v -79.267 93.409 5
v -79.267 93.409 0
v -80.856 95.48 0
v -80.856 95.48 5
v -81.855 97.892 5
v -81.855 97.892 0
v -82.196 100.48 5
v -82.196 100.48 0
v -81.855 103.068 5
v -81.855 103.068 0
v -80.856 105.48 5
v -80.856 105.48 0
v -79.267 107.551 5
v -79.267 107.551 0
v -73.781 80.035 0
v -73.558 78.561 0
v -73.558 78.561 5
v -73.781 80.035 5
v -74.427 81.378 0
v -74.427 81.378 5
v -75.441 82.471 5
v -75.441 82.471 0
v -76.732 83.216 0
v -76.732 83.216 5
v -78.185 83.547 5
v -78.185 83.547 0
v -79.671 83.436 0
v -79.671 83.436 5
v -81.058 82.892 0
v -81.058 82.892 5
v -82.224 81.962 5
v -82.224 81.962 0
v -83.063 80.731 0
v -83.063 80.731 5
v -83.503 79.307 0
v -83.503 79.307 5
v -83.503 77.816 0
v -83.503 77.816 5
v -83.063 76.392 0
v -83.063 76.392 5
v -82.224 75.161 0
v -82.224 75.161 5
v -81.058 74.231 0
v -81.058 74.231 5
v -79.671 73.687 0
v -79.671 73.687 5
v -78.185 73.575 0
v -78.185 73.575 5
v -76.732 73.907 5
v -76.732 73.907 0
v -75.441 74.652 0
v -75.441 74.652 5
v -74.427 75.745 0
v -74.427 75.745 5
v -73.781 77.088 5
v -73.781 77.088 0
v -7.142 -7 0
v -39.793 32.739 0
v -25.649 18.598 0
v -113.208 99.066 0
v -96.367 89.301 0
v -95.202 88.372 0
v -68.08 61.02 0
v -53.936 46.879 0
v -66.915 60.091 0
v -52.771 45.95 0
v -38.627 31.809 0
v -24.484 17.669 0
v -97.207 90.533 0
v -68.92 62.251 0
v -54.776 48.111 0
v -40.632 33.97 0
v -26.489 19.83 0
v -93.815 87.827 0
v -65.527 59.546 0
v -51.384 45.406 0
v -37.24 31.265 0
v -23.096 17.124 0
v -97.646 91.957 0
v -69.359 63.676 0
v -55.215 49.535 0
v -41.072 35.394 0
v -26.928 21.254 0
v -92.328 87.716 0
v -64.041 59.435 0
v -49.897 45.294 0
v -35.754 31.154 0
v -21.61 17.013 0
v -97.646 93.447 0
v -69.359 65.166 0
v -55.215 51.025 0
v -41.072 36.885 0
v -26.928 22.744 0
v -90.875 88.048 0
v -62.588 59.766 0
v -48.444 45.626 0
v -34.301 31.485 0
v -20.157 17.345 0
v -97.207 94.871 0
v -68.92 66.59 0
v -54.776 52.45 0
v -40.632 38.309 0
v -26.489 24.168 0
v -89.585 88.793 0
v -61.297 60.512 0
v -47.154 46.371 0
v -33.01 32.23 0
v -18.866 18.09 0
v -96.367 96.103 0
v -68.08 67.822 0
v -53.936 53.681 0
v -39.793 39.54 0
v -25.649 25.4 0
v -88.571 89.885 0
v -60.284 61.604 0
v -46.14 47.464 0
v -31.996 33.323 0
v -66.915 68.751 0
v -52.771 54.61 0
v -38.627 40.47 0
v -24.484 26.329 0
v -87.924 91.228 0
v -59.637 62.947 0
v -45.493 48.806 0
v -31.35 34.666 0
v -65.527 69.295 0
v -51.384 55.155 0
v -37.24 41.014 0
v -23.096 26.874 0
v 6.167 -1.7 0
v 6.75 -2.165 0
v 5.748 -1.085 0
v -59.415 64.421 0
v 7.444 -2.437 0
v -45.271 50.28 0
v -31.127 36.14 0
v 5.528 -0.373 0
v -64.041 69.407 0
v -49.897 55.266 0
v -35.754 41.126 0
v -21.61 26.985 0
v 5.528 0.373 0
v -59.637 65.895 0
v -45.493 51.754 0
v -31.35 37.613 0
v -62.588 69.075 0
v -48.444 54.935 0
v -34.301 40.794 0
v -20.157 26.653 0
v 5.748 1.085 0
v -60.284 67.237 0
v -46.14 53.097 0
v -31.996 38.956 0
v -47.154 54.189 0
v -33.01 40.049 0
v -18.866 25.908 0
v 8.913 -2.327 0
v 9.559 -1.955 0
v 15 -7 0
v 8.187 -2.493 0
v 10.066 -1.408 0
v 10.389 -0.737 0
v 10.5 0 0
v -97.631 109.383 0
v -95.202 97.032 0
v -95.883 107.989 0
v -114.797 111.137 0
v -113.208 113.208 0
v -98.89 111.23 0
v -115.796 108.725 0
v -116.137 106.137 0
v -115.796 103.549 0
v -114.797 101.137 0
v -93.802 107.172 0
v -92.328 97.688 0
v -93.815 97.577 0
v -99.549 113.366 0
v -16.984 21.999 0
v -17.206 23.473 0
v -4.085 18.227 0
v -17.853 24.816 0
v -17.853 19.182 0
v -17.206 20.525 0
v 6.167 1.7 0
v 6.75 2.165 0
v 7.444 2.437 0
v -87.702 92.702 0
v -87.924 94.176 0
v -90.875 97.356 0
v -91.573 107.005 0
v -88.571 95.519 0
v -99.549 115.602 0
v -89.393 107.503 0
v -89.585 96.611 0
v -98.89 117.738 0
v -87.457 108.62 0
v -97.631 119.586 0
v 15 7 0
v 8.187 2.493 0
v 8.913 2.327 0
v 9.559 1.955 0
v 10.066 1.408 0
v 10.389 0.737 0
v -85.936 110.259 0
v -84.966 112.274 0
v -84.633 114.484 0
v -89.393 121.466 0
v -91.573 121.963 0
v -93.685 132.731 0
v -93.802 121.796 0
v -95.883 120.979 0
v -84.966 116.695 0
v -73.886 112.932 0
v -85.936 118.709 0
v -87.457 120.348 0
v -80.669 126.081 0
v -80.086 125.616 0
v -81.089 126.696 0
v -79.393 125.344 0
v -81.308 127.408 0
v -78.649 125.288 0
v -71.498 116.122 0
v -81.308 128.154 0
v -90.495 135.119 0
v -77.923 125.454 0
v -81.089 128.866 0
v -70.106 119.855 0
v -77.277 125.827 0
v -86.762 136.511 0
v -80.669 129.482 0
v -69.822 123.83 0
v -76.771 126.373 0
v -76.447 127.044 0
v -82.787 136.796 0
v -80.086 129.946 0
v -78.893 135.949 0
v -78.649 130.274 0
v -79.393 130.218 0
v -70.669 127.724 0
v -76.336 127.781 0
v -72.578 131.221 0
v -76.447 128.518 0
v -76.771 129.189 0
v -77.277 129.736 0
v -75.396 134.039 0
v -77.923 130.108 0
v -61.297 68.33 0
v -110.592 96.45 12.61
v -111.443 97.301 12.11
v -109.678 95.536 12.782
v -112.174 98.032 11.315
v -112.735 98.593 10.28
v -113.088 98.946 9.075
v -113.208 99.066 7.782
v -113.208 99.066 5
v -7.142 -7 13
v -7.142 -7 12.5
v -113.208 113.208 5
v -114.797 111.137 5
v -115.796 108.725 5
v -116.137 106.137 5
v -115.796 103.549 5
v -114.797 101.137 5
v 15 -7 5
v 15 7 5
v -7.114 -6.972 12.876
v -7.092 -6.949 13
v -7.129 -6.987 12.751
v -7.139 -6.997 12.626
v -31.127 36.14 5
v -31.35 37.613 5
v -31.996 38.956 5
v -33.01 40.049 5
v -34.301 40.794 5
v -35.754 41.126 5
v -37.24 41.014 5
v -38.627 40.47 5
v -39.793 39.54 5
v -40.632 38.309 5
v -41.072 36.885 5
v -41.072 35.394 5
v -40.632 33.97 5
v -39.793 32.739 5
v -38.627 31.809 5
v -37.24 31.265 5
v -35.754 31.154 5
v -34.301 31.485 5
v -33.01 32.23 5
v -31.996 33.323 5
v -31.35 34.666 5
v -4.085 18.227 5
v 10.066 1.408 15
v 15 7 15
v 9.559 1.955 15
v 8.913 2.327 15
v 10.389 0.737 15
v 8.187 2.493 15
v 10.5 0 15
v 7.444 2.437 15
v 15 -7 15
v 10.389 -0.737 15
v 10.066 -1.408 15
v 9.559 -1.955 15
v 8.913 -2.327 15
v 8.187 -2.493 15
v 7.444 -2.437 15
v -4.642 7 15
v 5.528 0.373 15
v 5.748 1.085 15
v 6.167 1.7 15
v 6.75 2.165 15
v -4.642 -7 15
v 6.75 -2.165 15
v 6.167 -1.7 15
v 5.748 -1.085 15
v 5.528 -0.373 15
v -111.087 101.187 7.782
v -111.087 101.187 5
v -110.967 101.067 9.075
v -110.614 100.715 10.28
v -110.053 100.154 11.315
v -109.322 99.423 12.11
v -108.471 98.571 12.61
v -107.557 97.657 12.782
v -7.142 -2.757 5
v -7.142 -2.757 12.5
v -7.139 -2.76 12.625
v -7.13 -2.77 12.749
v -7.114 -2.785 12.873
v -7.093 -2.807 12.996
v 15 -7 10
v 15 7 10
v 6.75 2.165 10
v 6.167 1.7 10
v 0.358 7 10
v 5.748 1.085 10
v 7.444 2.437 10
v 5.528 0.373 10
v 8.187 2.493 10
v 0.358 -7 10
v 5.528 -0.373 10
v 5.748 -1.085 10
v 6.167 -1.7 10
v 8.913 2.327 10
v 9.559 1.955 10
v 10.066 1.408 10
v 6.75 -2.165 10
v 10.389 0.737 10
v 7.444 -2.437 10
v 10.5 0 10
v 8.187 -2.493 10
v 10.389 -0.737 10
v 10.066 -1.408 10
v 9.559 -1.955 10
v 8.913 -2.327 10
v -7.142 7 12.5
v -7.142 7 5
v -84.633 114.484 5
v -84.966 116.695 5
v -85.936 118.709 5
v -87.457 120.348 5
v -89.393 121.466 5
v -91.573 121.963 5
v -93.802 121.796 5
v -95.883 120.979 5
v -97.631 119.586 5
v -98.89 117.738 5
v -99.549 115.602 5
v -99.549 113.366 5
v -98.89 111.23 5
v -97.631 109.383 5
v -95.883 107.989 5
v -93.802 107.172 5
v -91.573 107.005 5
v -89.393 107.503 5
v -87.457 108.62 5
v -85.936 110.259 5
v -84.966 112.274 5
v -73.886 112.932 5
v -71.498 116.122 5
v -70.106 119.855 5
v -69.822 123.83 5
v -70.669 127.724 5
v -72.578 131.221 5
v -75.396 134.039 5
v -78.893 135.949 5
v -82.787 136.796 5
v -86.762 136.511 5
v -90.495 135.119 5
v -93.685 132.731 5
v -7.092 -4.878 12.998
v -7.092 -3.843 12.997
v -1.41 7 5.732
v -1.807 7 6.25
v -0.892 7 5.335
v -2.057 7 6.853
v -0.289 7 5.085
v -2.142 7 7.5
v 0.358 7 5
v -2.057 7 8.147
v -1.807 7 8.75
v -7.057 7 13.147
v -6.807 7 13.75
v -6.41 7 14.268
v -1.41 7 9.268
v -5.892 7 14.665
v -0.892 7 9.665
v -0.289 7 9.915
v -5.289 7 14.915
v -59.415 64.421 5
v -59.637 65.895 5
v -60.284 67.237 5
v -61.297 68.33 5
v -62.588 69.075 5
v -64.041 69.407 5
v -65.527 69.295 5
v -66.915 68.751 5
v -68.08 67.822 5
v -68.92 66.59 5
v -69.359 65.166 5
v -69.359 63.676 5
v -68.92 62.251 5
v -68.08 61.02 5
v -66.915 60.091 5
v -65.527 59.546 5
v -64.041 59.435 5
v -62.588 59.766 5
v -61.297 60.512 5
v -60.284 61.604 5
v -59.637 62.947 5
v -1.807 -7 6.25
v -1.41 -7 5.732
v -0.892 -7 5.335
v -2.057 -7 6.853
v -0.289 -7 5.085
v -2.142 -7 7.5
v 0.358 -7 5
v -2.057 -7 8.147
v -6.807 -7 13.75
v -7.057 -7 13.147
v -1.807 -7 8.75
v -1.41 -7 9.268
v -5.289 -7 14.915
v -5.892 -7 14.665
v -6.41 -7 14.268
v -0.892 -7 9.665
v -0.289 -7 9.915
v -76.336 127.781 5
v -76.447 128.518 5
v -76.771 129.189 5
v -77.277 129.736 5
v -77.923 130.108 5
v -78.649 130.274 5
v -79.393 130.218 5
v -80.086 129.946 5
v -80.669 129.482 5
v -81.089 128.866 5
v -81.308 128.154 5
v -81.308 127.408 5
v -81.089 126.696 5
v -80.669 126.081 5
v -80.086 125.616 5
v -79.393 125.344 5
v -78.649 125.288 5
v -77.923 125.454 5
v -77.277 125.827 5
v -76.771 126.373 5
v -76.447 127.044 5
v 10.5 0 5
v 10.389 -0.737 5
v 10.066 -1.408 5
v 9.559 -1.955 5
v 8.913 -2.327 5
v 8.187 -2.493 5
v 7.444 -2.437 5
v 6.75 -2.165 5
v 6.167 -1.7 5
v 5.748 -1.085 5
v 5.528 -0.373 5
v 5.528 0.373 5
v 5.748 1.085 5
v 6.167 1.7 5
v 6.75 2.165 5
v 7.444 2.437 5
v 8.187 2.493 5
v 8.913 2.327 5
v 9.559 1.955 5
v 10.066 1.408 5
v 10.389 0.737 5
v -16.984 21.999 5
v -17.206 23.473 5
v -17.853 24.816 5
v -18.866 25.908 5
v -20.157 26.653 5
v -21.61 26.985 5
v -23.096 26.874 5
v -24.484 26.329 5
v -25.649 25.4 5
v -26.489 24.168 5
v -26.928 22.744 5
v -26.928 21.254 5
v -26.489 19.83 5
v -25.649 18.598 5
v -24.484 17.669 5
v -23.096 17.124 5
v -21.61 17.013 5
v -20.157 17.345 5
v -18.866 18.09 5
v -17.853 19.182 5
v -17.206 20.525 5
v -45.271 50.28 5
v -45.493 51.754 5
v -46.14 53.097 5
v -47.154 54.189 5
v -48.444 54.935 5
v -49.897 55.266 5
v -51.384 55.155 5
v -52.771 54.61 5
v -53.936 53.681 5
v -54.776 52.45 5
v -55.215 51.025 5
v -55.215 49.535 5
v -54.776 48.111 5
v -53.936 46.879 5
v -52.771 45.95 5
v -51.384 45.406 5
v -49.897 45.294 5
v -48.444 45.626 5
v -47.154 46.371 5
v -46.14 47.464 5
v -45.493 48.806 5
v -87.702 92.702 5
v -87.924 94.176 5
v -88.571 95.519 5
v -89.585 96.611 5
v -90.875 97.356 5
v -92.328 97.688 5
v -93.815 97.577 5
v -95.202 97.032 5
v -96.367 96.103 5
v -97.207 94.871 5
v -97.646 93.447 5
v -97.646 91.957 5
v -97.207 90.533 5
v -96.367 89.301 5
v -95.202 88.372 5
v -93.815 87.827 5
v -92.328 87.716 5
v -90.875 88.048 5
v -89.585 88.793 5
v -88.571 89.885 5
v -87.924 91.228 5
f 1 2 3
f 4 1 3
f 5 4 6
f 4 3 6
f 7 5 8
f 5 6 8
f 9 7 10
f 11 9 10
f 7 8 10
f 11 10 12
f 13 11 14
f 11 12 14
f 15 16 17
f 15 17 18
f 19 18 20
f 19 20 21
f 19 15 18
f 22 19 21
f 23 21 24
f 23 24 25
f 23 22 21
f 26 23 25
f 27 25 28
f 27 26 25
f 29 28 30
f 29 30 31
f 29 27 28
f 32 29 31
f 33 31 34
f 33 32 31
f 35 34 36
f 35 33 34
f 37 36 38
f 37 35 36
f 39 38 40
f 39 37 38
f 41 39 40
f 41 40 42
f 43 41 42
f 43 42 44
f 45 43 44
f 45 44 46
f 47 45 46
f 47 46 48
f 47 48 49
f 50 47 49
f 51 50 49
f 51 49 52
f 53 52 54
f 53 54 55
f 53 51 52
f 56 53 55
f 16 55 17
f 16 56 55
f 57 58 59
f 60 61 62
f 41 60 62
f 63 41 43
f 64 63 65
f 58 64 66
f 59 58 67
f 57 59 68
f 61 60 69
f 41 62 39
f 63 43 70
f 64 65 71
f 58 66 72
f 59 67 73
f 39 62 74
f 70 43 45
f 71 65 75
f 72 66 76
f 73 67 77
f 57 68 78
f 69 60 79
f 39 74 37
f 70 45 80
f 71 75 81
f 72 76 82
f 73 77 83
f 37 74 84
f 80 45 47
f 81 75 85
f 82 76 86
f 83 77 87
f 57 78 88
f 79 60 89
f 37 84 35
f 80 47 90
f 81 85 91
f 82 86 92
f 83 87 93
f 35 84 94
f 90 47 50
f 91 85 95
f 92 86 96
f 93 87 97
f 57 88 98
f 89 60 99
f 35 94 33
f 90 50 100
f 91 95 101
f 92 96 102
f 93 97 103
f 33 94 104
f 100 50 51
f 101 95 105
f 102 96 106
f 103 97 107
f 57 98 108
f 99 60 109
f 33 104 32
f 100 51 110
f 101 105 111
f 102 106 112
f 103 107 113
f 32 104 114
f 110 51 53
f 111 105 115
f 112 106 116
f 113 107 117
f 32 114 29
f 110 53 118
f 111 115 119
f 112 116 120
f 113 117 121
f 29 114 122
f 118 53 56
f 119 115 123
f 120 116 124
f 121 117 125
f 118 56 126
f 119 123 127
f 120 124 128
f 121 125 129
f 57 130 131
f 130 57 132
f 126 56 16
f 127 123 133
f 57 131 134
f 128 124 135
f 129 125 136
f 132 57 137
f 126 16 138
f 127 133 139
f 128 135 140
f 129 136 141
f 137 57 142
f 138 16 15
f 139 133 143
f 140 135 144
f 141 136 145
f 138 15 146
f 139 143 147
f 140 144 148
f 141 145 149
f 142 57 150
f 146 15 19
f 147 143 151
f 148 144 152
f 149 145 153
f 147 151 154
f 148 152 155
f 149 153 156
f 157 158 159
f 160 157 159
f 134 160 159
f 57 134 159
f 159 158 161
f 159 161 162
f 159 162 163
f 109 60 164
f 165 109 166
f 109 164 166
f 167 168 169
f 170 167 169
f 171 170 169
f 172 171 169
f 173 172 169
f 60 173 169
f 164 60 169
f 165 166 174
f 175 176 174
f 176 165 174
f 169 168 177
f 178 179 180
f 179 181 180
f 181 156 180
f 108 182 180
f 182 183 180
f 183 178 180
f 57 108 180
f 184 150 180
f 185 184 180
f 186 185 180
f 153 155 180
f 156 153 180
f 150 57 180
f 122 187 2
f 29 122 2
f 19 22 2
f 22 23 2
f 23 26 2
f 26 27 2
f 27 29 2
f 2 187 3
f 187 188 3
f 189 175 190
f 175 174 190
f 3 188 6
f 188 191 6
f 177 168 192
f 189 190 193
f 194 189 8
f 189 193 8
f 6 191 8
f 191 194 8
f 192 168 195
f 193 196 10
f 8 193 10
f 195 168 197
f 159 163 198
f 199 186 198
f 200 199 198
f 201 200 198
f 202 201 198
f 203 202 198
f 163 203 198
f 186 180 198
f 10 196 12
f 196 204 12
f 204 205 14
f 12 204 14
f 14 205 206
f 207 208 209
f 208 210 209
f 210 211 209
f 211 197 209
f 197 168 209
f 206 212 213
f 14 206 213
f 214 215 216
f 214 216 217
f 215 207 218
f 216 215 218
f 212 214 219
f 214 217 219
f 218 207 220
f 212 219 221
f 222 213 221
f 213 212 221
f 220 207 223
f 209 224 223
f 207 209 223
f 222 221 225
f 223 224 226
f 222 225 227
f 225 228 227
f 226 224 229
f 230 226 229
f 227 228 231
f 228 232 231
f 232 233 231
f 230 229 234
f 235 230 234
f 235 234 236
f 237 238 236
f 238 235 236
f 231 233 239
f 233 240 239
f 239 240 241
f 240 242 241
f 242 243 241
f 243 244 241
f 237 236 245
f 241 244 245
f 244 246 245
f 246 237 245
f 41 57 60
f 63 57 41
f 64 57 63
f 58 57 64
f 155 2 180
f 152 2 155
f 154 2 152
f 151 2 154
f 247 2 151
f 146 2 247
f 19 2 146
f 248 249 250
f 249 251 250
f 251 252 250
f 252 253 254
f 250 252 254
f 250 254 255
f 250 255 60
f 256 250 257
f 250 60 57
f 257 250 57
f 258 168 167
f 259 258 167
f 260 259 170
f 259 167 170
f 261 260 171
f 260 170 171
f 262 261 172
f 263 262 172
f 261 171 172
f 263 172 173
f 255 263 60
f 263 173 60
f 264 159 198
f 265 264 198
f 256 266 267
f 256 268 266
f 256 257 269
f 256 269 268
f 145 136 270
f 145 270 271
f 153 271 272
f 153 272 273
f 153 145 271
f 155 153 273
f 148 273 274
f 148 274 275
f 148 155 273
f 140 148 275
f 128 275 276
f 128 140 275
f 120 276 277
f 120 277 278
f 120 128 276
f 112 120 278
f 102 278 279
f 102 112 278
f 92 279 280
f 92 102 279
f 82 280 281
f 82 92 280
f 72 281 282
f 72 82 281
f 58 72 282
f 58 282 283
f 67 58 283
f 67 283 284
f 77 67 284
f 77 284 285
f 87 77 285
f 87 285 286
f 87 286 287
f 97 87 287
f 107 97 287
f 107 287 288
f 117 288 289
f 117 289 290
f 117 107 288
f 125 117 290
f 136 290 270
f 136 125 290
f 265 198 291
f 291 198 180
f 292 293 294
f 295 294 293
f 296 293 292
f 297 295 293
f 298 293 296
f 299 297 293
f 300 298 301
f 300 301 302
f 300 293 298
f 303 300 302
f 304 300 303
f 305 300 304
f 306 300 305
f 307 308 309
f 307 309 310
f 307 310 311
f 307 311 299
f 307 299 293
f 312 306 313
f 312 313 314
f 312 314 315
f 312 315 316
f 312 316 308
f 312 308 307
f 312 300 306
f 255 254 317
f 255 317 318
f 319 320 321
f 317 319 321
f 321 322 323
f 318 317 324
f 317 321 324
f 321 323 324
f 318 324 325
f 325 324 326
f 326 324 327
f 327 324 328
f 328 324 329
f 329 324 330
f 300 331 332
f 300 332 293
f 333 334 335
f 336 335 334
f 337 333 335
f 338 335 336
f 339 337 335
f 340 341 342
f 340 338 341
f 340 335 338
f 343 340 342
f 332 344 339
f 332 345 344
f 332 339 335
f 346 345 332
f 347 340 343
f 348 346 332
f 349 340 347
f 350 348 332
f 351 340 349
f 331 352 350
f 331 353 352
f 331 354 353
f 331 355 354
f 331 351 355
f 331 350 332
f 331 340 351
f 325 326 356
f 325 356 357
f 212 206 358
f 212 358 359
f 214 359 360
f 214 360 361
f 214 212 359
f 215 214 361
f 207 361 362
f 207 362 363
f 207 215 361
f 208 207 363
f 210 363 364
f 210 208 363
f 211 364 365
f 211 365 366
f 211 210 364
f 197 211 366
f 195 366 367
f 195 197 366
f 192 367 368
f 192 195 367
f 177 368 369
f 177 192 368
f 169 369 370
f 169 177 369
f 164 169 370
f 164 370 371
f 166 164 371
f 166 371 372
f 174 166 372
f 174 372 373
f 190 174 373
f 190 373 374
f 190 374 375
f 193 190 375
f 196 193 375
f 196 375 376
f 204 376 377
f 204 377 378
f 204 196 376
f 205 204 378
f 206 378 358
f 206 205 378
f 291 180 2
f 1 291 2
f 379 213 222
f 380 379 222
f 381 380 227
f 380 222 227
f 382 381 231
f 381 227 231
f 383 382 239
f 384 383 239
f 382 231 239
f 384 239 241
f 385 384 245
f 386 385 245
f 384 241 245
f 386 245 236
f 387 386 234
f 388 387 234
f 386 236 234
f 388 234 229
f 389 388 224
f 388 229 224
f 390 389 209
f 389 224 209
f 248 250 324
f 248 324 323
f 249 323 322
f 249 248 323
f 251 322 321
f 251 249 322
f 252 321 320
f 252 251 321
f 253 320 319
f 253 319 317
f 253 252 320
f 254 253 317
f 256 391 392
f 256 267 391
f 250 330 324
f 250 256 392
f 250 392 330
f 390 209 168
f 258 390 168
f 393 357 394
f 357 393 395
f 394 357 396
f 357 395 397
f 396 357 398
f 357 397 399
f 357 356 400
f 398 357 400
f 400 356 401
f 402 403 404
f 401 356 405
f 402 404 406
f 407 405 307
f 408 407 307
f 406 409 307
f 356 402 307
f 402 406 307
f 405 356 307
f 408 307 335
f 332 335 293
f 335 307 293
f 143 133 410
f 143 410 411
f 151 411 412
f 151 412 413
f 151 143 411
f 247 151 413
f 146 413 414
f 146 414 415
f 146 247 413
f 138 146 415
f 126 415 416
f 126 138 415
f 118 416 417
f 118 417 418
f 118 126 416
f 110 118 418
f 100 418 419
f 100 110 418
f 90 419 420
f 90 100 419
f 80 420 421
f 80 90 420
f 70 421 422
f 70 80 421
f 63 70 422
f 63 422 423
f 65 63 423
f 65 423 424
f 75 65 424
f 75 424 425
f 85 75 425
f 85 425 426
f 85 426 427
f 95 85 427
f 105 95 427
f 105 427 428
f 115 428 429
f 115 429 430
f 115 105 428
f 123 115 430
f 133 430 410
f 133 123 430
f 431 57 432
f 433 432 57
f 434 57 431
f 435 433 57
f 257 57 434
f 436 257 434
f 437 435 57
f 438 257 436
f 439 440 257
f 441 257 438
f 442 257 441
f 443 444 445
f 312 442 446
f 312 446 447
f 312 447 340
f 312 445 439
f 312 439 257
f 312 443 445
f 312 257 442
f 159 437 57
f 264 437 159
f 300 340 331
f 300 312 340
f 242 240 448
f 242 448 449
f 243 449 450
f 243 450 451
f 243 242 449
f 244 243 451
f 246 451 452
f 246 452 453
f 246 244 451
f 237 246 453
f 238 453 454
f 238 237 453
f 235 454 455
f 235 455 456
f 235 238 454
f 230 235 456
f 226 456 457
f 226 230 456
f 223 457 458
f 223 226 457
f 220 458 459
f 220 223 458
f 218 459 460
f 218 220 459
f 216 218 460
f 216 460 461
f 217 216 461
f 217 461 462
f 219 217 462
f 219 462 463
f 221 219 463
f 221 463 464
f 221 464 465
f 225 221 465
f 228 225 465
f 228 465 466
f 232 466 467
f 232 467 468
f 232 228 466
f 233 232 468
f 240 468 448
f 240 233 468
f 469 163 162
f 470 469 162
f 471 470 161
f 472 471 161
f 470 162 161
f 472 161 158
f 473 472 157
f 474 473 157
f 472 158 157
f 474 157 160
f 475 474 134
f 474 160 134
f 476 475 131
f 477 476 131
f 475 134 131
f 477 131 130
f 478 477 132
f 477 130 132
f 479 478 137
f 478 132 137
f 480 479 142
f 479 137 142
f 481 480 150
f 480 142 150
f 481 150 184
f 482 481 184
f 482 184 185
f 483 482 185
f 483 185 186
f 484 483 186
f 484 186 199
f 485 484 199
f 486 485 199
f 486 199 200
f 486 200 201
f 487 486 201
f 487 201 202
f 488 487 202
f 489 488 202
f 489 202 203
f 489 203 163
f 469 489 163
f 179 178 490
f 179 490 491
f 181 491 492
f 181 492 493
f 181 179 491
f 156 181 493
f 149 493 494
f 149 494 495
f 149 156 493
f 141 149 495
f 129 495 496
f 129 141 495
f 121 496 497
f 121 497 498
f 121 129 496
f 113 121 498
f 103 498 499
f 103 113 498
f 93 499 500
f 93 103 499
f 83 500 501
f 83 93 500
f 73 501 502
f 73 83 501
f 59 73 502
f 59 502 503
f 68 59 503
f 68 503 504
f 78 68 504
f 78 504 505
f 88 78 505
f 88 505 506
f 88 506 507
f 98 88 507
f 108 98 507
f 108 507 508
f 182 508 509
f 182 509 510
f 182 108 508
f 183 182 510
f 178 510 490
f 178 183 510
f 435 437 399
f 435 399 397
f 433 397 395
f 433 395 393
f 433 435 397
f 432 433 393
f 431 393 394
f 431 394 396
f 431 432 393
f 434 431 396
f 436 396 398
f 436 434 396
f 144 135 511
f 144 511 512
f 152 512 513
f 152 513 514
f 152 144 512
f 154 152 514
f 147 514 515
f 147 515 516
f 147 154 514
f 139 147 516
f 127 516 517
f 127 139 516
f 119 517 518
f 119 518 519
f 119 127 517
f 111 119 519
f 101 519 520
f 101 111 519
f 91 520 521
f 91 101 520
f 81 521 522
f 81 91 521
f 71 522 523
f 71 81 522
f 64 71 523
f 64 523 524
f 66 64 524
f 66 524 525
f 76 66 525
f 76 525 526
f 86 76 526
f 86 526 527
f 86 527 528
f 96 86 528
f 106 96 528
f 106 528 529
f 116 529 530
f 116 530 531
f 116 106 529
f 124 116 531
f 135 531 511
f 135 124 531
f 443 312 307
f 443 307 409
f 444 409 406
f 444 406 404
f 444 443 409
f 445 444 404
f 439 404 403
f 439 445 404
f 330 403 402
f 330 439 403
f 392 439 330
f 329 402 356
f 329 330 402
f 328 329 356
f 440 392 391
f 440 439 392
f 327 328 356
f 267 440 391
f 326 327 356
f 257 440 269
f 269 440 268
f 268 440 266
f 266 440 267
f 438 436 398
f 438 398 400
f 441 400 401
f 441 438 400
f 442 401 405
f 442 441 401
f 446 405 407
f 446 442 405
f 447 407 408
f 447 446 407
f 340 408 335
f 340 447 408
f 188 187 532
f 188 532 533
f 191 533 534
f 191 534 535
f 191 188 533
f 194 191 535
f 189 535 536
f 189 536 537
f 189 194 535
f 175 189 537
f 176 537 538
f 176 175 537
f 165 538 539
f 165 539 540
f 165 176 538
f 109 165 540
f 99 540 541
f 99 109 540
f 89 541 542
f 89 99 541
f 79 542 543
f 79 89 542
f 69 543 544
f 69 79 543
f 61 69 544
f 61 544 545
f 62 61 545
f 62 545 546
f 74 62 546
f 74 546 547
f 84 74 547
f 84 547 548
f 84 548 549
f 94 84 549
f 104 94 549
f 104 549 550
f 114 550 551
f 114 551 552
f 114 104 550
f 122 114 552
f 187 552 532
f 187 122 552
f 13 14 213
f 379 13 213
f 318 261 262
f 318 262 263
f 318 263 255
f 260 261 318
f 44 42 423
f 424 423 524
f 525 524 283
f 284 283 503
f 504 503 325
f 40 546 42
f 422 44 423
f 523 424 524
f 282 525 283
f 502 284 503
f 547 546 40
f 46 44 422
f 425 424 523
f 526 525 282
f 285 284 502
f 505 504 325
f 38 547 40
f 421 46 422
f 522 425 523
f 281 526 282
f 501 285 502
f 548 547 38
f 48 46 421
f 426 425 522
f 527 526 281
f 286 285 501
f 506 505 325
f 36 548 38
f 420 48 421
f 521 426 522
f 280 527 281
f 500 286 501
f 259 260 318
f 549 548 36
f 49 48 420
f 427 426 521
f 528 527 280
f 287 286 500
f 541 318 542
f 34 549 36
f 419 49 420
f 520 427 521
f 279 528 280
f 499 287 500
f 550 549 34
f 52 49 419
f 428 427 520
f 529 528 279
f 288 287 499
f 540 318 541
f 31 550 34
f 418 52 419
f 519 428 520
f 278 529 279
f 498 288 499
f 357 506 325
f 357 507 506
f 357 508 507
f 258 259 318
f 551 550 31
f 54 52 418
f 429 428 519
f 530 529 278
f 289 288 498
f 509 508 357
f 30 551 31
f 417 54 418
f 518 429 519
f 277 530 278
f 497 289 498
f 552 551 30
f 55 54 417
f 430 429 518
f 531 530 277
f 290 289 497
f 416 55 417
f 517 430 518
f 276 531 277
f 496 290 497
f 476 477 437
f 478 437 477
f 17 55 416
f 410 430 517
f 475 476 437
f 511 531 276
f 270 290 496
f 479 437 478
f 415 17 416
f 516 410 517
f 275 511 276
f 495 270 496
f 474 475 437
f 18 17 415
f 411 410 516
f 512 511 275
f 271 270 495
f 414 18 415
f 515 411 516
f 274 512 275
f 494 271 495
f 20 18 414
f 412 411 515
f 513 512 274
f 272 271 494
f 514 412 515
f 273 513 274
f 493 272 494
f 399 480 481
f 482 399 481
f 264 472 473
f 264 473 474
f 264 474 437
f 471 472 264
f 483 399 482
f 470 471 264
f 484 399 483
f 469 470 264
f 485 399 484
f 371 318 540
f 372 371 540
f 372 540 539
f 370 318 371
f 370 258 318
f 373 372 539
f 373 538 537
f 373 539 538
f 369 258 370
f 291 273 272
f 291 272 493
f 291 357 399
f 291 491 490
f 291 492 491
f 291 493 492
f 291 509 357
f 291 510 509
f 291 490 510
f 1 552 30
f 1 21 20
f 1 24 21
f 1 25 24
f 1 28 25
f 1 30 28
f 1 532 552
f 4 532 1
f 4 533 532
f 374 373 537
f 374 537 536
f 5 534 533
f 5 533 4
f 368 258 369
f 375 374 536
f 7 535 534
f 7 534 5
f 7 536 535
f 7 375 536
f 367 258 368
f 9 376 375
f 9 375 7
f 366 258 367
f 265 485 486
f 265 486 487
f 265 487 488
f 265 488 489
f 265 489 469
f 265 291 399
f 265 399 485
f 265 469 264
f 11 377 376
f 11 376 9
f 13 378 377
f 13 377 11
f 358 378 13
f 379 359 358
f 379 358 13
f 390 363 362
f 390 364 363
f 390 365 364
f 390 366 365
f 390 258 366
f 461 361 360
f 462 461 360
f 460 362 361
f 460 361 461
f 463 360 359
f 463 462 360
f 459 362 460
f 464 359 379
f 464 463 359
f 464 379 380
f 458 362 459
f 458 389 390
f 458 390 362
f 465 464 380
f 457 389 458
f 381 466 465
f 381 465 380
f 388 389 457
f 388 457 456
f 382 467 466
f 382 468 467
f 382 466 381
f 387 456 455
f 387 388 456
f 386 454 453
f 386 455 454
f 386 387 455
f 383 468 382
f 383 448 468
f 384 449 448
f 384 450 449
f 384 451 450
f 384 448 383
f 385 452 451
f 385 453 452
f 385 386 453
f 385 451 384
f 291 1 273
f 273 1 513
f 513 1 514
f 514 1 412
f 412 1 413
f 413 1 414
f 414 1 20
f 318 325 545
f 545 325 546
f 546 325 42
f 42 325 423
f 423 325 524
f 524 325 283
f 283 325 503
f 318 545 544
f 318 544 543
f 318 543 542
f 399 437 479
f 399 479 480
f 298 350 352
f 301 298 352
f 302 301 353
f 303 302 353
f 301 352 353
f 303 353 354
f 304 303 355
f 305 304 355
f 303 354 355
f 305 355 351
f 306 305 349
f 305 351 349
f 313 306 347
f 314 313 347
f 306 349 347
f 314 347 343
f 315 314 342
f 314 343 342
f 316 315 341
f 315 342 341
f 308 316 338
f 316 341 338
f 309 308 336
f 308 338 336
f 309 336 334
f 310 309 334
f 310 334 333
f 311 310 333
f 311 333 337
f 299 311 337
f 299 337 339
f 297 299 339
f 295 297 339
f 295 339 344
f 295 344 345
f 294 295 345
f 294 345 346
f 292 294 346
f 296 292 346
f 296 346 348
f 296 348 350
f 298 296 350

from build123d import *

# Parameters (mm, degrees)
F0_R     = 5
F0_R_2   = 7.5
F0_R_3   = 2.5
F1_DEPTH = 5
F3_DEPTH = 14
F5_R     = 2.5
F6_DEPTH = 25
F7_R     = 2.5
F8_DEPTH = 5
F4_W     = 150
F4_H     = 5
F9_DEPTH = 3


with BuildPart() as f1:
    # F0 (on Top) → F1 (new body)
    with BuildSketch(Plane.XY):
        with BuildLine():
            Line((15, 7), (-4.0848081724, 18.2269437961))
            Line((-4.0848081724, 18.2269437961), (-79.2670273048, 93.4091629285))
            ThreePointArc((-79.2670273048, 93.4091629285), (-82.1959594929, 100.4802307404), (-79.2670273048, 107.5512985522))
            Line((-79.2670273048, 107.5512985522), (-73.8864699203, 112.9318559367))
            ThreePointArc((-73.8864699203, 112.9318559367), (-73.8864699203, 132.7308458099), (-93.6854597935, 132.7308458099))
            Line((-93.6854597935, 132.7308458099), (-113.2081528017, 113.2081528017))
            ThreePointArc((-113.2081528017, 113.2081528017), (-116.1370849898, 106.1370849898), (-113.2081528017, 99.066017178))
            Line((-113.2081528017, 99.066017178), (-7.1421356237, -7))
            Line((-7.1421356237, -7), (15, -7))
            Line((15, -7), (15, 7))
        make_face()
        with Locations((-64.4147610714, 64.4208090516)):
            Circle(F0_R, mode=Mode.SUBTRACT)
        with Locations((-21.9838184576, 21.998938408)):
            Circle(F0_R, mode=Mode.SUBTRACT)
        with Locations((-36.1274659955, 36.1395619558)):
            Circle(F0_R, mode=Mode.SUBTRACT)
        with Locations((-50.2711135335, 50.2801855037)):
            Circle(F0_R, mode=Mode.SUBTRACT)
        with Locations((-92.7020561473, 92.7020561473)):
            Circle(F0_R, mode=Mode.SUBTRACT)
        with Locations((-78.5584086094, 78.5614325994)):
            Circle(F0_R, mode=Mode.SUBTRACT)
        with Locations((-92.1330977986, 114.4842179316)):
            Circle(F0_R_2, mode=Mode.SUBTRACT)
        with Locations((-78.8362173886, 127.7810983416)):
            Circle(F0_R_3, mode=Mode.SUBTRACT)
    extrude(amount=F1_DEPTH)


with BuildPart() as f3:
    # F2 (on face) → F3 (new body)
    with BuildSketch(Plane.XZ.offset(7)):
        with BuildLine():
            Line((-7.1421356237, 12.5), (-7.1421356237, 5))
            Line((-7.1421356237, 5), (0.3578643763, 5))
            ThreePointArc((0.3578643763, 5), (-1.4099025767, 5.732233047), (-2.1421356237, 7.5))
            ThreePointArc((-2.1421356237, 7.5), (-1.4099025767, 9.267766953), (0.3578643763, 10))
            Line((0.3578643763, 10), (15, 10))
            Line((15, 10), (15, 15))
            Line((15, 15), (-4.6421356237, 15))
            ThreePointArc((-4.6421356237, 15), (-6.4099025767, 14.267766953), (-7.1421356237, 12.5))
        make_face()
    extrude(amount=-F3_DEPTH)


with BuildPart() as f6_tool:
    # F5 (on face) → F6 (new body)
    with BuildSketch(Plane(origin=(0, 0, 0), x_dir=(1, 0, 0), z_dir=(0, 0, -1))):
        with Locations((8, 0)):
            Circle(F5_R)
    extrude(amount=-F6_DEPTH)


with BuildPart() as f1_1:
    add(f1.part)

    # F6: cut by f6_tool
    add(f6_tool.part, mode=Mode.SUBTRACT)

    # F7 (on face) → F8 (cut)
    with BuildSketch(Plane.XY.offset(15)):
        with Locations((8, 0)):
            Circle(F7_R)
    extrude(amount=-F8_DEPTH, mode=Mode.SUBTRACT)



with BuildPart() as f3_1:
    add(f3.part)

    # F6: cut by f6_tool
    add(f6_tool.part, mode=Mode.SUBTRACT)


with BuildPart() as f1_2:
    add(f1_1.part)

    add(f3_1.part)  # F9 merges F3
    # F4 (on face) → F9 (join)
    with BuildSketch(Plane(origin=(-7.0710678119, -7.0710678119, 0), x_dir=(0.7071067812, -0.7071067812, 0), z_dir=(-0.7071067812, -0.7071067812, 0))):
        with Locations((-75.1005050634, 2.5)):
            Rectangle(F4_W, F4_H)
        with BuildLine():
            Line((-150.1005050634, 5), (-0.1005050634, 5))
            Line((-0.1005050634, 5), (-0.1005050634, 13))
            Line((-0.1005050634, 13), (-145.1080126235, 12.782269238))
            ThreePointArc((-145.1080126235, 12.782269238), (-148.638692297, 11.3151534598), (-150.1005050634, 7.7822748743))
            Line((-150.1005050634, 7.7822748743), (-150.1005050634, 5))
        make_face()
    extrude(amount=-F9_DEPTH)


solid = f1_2.part
